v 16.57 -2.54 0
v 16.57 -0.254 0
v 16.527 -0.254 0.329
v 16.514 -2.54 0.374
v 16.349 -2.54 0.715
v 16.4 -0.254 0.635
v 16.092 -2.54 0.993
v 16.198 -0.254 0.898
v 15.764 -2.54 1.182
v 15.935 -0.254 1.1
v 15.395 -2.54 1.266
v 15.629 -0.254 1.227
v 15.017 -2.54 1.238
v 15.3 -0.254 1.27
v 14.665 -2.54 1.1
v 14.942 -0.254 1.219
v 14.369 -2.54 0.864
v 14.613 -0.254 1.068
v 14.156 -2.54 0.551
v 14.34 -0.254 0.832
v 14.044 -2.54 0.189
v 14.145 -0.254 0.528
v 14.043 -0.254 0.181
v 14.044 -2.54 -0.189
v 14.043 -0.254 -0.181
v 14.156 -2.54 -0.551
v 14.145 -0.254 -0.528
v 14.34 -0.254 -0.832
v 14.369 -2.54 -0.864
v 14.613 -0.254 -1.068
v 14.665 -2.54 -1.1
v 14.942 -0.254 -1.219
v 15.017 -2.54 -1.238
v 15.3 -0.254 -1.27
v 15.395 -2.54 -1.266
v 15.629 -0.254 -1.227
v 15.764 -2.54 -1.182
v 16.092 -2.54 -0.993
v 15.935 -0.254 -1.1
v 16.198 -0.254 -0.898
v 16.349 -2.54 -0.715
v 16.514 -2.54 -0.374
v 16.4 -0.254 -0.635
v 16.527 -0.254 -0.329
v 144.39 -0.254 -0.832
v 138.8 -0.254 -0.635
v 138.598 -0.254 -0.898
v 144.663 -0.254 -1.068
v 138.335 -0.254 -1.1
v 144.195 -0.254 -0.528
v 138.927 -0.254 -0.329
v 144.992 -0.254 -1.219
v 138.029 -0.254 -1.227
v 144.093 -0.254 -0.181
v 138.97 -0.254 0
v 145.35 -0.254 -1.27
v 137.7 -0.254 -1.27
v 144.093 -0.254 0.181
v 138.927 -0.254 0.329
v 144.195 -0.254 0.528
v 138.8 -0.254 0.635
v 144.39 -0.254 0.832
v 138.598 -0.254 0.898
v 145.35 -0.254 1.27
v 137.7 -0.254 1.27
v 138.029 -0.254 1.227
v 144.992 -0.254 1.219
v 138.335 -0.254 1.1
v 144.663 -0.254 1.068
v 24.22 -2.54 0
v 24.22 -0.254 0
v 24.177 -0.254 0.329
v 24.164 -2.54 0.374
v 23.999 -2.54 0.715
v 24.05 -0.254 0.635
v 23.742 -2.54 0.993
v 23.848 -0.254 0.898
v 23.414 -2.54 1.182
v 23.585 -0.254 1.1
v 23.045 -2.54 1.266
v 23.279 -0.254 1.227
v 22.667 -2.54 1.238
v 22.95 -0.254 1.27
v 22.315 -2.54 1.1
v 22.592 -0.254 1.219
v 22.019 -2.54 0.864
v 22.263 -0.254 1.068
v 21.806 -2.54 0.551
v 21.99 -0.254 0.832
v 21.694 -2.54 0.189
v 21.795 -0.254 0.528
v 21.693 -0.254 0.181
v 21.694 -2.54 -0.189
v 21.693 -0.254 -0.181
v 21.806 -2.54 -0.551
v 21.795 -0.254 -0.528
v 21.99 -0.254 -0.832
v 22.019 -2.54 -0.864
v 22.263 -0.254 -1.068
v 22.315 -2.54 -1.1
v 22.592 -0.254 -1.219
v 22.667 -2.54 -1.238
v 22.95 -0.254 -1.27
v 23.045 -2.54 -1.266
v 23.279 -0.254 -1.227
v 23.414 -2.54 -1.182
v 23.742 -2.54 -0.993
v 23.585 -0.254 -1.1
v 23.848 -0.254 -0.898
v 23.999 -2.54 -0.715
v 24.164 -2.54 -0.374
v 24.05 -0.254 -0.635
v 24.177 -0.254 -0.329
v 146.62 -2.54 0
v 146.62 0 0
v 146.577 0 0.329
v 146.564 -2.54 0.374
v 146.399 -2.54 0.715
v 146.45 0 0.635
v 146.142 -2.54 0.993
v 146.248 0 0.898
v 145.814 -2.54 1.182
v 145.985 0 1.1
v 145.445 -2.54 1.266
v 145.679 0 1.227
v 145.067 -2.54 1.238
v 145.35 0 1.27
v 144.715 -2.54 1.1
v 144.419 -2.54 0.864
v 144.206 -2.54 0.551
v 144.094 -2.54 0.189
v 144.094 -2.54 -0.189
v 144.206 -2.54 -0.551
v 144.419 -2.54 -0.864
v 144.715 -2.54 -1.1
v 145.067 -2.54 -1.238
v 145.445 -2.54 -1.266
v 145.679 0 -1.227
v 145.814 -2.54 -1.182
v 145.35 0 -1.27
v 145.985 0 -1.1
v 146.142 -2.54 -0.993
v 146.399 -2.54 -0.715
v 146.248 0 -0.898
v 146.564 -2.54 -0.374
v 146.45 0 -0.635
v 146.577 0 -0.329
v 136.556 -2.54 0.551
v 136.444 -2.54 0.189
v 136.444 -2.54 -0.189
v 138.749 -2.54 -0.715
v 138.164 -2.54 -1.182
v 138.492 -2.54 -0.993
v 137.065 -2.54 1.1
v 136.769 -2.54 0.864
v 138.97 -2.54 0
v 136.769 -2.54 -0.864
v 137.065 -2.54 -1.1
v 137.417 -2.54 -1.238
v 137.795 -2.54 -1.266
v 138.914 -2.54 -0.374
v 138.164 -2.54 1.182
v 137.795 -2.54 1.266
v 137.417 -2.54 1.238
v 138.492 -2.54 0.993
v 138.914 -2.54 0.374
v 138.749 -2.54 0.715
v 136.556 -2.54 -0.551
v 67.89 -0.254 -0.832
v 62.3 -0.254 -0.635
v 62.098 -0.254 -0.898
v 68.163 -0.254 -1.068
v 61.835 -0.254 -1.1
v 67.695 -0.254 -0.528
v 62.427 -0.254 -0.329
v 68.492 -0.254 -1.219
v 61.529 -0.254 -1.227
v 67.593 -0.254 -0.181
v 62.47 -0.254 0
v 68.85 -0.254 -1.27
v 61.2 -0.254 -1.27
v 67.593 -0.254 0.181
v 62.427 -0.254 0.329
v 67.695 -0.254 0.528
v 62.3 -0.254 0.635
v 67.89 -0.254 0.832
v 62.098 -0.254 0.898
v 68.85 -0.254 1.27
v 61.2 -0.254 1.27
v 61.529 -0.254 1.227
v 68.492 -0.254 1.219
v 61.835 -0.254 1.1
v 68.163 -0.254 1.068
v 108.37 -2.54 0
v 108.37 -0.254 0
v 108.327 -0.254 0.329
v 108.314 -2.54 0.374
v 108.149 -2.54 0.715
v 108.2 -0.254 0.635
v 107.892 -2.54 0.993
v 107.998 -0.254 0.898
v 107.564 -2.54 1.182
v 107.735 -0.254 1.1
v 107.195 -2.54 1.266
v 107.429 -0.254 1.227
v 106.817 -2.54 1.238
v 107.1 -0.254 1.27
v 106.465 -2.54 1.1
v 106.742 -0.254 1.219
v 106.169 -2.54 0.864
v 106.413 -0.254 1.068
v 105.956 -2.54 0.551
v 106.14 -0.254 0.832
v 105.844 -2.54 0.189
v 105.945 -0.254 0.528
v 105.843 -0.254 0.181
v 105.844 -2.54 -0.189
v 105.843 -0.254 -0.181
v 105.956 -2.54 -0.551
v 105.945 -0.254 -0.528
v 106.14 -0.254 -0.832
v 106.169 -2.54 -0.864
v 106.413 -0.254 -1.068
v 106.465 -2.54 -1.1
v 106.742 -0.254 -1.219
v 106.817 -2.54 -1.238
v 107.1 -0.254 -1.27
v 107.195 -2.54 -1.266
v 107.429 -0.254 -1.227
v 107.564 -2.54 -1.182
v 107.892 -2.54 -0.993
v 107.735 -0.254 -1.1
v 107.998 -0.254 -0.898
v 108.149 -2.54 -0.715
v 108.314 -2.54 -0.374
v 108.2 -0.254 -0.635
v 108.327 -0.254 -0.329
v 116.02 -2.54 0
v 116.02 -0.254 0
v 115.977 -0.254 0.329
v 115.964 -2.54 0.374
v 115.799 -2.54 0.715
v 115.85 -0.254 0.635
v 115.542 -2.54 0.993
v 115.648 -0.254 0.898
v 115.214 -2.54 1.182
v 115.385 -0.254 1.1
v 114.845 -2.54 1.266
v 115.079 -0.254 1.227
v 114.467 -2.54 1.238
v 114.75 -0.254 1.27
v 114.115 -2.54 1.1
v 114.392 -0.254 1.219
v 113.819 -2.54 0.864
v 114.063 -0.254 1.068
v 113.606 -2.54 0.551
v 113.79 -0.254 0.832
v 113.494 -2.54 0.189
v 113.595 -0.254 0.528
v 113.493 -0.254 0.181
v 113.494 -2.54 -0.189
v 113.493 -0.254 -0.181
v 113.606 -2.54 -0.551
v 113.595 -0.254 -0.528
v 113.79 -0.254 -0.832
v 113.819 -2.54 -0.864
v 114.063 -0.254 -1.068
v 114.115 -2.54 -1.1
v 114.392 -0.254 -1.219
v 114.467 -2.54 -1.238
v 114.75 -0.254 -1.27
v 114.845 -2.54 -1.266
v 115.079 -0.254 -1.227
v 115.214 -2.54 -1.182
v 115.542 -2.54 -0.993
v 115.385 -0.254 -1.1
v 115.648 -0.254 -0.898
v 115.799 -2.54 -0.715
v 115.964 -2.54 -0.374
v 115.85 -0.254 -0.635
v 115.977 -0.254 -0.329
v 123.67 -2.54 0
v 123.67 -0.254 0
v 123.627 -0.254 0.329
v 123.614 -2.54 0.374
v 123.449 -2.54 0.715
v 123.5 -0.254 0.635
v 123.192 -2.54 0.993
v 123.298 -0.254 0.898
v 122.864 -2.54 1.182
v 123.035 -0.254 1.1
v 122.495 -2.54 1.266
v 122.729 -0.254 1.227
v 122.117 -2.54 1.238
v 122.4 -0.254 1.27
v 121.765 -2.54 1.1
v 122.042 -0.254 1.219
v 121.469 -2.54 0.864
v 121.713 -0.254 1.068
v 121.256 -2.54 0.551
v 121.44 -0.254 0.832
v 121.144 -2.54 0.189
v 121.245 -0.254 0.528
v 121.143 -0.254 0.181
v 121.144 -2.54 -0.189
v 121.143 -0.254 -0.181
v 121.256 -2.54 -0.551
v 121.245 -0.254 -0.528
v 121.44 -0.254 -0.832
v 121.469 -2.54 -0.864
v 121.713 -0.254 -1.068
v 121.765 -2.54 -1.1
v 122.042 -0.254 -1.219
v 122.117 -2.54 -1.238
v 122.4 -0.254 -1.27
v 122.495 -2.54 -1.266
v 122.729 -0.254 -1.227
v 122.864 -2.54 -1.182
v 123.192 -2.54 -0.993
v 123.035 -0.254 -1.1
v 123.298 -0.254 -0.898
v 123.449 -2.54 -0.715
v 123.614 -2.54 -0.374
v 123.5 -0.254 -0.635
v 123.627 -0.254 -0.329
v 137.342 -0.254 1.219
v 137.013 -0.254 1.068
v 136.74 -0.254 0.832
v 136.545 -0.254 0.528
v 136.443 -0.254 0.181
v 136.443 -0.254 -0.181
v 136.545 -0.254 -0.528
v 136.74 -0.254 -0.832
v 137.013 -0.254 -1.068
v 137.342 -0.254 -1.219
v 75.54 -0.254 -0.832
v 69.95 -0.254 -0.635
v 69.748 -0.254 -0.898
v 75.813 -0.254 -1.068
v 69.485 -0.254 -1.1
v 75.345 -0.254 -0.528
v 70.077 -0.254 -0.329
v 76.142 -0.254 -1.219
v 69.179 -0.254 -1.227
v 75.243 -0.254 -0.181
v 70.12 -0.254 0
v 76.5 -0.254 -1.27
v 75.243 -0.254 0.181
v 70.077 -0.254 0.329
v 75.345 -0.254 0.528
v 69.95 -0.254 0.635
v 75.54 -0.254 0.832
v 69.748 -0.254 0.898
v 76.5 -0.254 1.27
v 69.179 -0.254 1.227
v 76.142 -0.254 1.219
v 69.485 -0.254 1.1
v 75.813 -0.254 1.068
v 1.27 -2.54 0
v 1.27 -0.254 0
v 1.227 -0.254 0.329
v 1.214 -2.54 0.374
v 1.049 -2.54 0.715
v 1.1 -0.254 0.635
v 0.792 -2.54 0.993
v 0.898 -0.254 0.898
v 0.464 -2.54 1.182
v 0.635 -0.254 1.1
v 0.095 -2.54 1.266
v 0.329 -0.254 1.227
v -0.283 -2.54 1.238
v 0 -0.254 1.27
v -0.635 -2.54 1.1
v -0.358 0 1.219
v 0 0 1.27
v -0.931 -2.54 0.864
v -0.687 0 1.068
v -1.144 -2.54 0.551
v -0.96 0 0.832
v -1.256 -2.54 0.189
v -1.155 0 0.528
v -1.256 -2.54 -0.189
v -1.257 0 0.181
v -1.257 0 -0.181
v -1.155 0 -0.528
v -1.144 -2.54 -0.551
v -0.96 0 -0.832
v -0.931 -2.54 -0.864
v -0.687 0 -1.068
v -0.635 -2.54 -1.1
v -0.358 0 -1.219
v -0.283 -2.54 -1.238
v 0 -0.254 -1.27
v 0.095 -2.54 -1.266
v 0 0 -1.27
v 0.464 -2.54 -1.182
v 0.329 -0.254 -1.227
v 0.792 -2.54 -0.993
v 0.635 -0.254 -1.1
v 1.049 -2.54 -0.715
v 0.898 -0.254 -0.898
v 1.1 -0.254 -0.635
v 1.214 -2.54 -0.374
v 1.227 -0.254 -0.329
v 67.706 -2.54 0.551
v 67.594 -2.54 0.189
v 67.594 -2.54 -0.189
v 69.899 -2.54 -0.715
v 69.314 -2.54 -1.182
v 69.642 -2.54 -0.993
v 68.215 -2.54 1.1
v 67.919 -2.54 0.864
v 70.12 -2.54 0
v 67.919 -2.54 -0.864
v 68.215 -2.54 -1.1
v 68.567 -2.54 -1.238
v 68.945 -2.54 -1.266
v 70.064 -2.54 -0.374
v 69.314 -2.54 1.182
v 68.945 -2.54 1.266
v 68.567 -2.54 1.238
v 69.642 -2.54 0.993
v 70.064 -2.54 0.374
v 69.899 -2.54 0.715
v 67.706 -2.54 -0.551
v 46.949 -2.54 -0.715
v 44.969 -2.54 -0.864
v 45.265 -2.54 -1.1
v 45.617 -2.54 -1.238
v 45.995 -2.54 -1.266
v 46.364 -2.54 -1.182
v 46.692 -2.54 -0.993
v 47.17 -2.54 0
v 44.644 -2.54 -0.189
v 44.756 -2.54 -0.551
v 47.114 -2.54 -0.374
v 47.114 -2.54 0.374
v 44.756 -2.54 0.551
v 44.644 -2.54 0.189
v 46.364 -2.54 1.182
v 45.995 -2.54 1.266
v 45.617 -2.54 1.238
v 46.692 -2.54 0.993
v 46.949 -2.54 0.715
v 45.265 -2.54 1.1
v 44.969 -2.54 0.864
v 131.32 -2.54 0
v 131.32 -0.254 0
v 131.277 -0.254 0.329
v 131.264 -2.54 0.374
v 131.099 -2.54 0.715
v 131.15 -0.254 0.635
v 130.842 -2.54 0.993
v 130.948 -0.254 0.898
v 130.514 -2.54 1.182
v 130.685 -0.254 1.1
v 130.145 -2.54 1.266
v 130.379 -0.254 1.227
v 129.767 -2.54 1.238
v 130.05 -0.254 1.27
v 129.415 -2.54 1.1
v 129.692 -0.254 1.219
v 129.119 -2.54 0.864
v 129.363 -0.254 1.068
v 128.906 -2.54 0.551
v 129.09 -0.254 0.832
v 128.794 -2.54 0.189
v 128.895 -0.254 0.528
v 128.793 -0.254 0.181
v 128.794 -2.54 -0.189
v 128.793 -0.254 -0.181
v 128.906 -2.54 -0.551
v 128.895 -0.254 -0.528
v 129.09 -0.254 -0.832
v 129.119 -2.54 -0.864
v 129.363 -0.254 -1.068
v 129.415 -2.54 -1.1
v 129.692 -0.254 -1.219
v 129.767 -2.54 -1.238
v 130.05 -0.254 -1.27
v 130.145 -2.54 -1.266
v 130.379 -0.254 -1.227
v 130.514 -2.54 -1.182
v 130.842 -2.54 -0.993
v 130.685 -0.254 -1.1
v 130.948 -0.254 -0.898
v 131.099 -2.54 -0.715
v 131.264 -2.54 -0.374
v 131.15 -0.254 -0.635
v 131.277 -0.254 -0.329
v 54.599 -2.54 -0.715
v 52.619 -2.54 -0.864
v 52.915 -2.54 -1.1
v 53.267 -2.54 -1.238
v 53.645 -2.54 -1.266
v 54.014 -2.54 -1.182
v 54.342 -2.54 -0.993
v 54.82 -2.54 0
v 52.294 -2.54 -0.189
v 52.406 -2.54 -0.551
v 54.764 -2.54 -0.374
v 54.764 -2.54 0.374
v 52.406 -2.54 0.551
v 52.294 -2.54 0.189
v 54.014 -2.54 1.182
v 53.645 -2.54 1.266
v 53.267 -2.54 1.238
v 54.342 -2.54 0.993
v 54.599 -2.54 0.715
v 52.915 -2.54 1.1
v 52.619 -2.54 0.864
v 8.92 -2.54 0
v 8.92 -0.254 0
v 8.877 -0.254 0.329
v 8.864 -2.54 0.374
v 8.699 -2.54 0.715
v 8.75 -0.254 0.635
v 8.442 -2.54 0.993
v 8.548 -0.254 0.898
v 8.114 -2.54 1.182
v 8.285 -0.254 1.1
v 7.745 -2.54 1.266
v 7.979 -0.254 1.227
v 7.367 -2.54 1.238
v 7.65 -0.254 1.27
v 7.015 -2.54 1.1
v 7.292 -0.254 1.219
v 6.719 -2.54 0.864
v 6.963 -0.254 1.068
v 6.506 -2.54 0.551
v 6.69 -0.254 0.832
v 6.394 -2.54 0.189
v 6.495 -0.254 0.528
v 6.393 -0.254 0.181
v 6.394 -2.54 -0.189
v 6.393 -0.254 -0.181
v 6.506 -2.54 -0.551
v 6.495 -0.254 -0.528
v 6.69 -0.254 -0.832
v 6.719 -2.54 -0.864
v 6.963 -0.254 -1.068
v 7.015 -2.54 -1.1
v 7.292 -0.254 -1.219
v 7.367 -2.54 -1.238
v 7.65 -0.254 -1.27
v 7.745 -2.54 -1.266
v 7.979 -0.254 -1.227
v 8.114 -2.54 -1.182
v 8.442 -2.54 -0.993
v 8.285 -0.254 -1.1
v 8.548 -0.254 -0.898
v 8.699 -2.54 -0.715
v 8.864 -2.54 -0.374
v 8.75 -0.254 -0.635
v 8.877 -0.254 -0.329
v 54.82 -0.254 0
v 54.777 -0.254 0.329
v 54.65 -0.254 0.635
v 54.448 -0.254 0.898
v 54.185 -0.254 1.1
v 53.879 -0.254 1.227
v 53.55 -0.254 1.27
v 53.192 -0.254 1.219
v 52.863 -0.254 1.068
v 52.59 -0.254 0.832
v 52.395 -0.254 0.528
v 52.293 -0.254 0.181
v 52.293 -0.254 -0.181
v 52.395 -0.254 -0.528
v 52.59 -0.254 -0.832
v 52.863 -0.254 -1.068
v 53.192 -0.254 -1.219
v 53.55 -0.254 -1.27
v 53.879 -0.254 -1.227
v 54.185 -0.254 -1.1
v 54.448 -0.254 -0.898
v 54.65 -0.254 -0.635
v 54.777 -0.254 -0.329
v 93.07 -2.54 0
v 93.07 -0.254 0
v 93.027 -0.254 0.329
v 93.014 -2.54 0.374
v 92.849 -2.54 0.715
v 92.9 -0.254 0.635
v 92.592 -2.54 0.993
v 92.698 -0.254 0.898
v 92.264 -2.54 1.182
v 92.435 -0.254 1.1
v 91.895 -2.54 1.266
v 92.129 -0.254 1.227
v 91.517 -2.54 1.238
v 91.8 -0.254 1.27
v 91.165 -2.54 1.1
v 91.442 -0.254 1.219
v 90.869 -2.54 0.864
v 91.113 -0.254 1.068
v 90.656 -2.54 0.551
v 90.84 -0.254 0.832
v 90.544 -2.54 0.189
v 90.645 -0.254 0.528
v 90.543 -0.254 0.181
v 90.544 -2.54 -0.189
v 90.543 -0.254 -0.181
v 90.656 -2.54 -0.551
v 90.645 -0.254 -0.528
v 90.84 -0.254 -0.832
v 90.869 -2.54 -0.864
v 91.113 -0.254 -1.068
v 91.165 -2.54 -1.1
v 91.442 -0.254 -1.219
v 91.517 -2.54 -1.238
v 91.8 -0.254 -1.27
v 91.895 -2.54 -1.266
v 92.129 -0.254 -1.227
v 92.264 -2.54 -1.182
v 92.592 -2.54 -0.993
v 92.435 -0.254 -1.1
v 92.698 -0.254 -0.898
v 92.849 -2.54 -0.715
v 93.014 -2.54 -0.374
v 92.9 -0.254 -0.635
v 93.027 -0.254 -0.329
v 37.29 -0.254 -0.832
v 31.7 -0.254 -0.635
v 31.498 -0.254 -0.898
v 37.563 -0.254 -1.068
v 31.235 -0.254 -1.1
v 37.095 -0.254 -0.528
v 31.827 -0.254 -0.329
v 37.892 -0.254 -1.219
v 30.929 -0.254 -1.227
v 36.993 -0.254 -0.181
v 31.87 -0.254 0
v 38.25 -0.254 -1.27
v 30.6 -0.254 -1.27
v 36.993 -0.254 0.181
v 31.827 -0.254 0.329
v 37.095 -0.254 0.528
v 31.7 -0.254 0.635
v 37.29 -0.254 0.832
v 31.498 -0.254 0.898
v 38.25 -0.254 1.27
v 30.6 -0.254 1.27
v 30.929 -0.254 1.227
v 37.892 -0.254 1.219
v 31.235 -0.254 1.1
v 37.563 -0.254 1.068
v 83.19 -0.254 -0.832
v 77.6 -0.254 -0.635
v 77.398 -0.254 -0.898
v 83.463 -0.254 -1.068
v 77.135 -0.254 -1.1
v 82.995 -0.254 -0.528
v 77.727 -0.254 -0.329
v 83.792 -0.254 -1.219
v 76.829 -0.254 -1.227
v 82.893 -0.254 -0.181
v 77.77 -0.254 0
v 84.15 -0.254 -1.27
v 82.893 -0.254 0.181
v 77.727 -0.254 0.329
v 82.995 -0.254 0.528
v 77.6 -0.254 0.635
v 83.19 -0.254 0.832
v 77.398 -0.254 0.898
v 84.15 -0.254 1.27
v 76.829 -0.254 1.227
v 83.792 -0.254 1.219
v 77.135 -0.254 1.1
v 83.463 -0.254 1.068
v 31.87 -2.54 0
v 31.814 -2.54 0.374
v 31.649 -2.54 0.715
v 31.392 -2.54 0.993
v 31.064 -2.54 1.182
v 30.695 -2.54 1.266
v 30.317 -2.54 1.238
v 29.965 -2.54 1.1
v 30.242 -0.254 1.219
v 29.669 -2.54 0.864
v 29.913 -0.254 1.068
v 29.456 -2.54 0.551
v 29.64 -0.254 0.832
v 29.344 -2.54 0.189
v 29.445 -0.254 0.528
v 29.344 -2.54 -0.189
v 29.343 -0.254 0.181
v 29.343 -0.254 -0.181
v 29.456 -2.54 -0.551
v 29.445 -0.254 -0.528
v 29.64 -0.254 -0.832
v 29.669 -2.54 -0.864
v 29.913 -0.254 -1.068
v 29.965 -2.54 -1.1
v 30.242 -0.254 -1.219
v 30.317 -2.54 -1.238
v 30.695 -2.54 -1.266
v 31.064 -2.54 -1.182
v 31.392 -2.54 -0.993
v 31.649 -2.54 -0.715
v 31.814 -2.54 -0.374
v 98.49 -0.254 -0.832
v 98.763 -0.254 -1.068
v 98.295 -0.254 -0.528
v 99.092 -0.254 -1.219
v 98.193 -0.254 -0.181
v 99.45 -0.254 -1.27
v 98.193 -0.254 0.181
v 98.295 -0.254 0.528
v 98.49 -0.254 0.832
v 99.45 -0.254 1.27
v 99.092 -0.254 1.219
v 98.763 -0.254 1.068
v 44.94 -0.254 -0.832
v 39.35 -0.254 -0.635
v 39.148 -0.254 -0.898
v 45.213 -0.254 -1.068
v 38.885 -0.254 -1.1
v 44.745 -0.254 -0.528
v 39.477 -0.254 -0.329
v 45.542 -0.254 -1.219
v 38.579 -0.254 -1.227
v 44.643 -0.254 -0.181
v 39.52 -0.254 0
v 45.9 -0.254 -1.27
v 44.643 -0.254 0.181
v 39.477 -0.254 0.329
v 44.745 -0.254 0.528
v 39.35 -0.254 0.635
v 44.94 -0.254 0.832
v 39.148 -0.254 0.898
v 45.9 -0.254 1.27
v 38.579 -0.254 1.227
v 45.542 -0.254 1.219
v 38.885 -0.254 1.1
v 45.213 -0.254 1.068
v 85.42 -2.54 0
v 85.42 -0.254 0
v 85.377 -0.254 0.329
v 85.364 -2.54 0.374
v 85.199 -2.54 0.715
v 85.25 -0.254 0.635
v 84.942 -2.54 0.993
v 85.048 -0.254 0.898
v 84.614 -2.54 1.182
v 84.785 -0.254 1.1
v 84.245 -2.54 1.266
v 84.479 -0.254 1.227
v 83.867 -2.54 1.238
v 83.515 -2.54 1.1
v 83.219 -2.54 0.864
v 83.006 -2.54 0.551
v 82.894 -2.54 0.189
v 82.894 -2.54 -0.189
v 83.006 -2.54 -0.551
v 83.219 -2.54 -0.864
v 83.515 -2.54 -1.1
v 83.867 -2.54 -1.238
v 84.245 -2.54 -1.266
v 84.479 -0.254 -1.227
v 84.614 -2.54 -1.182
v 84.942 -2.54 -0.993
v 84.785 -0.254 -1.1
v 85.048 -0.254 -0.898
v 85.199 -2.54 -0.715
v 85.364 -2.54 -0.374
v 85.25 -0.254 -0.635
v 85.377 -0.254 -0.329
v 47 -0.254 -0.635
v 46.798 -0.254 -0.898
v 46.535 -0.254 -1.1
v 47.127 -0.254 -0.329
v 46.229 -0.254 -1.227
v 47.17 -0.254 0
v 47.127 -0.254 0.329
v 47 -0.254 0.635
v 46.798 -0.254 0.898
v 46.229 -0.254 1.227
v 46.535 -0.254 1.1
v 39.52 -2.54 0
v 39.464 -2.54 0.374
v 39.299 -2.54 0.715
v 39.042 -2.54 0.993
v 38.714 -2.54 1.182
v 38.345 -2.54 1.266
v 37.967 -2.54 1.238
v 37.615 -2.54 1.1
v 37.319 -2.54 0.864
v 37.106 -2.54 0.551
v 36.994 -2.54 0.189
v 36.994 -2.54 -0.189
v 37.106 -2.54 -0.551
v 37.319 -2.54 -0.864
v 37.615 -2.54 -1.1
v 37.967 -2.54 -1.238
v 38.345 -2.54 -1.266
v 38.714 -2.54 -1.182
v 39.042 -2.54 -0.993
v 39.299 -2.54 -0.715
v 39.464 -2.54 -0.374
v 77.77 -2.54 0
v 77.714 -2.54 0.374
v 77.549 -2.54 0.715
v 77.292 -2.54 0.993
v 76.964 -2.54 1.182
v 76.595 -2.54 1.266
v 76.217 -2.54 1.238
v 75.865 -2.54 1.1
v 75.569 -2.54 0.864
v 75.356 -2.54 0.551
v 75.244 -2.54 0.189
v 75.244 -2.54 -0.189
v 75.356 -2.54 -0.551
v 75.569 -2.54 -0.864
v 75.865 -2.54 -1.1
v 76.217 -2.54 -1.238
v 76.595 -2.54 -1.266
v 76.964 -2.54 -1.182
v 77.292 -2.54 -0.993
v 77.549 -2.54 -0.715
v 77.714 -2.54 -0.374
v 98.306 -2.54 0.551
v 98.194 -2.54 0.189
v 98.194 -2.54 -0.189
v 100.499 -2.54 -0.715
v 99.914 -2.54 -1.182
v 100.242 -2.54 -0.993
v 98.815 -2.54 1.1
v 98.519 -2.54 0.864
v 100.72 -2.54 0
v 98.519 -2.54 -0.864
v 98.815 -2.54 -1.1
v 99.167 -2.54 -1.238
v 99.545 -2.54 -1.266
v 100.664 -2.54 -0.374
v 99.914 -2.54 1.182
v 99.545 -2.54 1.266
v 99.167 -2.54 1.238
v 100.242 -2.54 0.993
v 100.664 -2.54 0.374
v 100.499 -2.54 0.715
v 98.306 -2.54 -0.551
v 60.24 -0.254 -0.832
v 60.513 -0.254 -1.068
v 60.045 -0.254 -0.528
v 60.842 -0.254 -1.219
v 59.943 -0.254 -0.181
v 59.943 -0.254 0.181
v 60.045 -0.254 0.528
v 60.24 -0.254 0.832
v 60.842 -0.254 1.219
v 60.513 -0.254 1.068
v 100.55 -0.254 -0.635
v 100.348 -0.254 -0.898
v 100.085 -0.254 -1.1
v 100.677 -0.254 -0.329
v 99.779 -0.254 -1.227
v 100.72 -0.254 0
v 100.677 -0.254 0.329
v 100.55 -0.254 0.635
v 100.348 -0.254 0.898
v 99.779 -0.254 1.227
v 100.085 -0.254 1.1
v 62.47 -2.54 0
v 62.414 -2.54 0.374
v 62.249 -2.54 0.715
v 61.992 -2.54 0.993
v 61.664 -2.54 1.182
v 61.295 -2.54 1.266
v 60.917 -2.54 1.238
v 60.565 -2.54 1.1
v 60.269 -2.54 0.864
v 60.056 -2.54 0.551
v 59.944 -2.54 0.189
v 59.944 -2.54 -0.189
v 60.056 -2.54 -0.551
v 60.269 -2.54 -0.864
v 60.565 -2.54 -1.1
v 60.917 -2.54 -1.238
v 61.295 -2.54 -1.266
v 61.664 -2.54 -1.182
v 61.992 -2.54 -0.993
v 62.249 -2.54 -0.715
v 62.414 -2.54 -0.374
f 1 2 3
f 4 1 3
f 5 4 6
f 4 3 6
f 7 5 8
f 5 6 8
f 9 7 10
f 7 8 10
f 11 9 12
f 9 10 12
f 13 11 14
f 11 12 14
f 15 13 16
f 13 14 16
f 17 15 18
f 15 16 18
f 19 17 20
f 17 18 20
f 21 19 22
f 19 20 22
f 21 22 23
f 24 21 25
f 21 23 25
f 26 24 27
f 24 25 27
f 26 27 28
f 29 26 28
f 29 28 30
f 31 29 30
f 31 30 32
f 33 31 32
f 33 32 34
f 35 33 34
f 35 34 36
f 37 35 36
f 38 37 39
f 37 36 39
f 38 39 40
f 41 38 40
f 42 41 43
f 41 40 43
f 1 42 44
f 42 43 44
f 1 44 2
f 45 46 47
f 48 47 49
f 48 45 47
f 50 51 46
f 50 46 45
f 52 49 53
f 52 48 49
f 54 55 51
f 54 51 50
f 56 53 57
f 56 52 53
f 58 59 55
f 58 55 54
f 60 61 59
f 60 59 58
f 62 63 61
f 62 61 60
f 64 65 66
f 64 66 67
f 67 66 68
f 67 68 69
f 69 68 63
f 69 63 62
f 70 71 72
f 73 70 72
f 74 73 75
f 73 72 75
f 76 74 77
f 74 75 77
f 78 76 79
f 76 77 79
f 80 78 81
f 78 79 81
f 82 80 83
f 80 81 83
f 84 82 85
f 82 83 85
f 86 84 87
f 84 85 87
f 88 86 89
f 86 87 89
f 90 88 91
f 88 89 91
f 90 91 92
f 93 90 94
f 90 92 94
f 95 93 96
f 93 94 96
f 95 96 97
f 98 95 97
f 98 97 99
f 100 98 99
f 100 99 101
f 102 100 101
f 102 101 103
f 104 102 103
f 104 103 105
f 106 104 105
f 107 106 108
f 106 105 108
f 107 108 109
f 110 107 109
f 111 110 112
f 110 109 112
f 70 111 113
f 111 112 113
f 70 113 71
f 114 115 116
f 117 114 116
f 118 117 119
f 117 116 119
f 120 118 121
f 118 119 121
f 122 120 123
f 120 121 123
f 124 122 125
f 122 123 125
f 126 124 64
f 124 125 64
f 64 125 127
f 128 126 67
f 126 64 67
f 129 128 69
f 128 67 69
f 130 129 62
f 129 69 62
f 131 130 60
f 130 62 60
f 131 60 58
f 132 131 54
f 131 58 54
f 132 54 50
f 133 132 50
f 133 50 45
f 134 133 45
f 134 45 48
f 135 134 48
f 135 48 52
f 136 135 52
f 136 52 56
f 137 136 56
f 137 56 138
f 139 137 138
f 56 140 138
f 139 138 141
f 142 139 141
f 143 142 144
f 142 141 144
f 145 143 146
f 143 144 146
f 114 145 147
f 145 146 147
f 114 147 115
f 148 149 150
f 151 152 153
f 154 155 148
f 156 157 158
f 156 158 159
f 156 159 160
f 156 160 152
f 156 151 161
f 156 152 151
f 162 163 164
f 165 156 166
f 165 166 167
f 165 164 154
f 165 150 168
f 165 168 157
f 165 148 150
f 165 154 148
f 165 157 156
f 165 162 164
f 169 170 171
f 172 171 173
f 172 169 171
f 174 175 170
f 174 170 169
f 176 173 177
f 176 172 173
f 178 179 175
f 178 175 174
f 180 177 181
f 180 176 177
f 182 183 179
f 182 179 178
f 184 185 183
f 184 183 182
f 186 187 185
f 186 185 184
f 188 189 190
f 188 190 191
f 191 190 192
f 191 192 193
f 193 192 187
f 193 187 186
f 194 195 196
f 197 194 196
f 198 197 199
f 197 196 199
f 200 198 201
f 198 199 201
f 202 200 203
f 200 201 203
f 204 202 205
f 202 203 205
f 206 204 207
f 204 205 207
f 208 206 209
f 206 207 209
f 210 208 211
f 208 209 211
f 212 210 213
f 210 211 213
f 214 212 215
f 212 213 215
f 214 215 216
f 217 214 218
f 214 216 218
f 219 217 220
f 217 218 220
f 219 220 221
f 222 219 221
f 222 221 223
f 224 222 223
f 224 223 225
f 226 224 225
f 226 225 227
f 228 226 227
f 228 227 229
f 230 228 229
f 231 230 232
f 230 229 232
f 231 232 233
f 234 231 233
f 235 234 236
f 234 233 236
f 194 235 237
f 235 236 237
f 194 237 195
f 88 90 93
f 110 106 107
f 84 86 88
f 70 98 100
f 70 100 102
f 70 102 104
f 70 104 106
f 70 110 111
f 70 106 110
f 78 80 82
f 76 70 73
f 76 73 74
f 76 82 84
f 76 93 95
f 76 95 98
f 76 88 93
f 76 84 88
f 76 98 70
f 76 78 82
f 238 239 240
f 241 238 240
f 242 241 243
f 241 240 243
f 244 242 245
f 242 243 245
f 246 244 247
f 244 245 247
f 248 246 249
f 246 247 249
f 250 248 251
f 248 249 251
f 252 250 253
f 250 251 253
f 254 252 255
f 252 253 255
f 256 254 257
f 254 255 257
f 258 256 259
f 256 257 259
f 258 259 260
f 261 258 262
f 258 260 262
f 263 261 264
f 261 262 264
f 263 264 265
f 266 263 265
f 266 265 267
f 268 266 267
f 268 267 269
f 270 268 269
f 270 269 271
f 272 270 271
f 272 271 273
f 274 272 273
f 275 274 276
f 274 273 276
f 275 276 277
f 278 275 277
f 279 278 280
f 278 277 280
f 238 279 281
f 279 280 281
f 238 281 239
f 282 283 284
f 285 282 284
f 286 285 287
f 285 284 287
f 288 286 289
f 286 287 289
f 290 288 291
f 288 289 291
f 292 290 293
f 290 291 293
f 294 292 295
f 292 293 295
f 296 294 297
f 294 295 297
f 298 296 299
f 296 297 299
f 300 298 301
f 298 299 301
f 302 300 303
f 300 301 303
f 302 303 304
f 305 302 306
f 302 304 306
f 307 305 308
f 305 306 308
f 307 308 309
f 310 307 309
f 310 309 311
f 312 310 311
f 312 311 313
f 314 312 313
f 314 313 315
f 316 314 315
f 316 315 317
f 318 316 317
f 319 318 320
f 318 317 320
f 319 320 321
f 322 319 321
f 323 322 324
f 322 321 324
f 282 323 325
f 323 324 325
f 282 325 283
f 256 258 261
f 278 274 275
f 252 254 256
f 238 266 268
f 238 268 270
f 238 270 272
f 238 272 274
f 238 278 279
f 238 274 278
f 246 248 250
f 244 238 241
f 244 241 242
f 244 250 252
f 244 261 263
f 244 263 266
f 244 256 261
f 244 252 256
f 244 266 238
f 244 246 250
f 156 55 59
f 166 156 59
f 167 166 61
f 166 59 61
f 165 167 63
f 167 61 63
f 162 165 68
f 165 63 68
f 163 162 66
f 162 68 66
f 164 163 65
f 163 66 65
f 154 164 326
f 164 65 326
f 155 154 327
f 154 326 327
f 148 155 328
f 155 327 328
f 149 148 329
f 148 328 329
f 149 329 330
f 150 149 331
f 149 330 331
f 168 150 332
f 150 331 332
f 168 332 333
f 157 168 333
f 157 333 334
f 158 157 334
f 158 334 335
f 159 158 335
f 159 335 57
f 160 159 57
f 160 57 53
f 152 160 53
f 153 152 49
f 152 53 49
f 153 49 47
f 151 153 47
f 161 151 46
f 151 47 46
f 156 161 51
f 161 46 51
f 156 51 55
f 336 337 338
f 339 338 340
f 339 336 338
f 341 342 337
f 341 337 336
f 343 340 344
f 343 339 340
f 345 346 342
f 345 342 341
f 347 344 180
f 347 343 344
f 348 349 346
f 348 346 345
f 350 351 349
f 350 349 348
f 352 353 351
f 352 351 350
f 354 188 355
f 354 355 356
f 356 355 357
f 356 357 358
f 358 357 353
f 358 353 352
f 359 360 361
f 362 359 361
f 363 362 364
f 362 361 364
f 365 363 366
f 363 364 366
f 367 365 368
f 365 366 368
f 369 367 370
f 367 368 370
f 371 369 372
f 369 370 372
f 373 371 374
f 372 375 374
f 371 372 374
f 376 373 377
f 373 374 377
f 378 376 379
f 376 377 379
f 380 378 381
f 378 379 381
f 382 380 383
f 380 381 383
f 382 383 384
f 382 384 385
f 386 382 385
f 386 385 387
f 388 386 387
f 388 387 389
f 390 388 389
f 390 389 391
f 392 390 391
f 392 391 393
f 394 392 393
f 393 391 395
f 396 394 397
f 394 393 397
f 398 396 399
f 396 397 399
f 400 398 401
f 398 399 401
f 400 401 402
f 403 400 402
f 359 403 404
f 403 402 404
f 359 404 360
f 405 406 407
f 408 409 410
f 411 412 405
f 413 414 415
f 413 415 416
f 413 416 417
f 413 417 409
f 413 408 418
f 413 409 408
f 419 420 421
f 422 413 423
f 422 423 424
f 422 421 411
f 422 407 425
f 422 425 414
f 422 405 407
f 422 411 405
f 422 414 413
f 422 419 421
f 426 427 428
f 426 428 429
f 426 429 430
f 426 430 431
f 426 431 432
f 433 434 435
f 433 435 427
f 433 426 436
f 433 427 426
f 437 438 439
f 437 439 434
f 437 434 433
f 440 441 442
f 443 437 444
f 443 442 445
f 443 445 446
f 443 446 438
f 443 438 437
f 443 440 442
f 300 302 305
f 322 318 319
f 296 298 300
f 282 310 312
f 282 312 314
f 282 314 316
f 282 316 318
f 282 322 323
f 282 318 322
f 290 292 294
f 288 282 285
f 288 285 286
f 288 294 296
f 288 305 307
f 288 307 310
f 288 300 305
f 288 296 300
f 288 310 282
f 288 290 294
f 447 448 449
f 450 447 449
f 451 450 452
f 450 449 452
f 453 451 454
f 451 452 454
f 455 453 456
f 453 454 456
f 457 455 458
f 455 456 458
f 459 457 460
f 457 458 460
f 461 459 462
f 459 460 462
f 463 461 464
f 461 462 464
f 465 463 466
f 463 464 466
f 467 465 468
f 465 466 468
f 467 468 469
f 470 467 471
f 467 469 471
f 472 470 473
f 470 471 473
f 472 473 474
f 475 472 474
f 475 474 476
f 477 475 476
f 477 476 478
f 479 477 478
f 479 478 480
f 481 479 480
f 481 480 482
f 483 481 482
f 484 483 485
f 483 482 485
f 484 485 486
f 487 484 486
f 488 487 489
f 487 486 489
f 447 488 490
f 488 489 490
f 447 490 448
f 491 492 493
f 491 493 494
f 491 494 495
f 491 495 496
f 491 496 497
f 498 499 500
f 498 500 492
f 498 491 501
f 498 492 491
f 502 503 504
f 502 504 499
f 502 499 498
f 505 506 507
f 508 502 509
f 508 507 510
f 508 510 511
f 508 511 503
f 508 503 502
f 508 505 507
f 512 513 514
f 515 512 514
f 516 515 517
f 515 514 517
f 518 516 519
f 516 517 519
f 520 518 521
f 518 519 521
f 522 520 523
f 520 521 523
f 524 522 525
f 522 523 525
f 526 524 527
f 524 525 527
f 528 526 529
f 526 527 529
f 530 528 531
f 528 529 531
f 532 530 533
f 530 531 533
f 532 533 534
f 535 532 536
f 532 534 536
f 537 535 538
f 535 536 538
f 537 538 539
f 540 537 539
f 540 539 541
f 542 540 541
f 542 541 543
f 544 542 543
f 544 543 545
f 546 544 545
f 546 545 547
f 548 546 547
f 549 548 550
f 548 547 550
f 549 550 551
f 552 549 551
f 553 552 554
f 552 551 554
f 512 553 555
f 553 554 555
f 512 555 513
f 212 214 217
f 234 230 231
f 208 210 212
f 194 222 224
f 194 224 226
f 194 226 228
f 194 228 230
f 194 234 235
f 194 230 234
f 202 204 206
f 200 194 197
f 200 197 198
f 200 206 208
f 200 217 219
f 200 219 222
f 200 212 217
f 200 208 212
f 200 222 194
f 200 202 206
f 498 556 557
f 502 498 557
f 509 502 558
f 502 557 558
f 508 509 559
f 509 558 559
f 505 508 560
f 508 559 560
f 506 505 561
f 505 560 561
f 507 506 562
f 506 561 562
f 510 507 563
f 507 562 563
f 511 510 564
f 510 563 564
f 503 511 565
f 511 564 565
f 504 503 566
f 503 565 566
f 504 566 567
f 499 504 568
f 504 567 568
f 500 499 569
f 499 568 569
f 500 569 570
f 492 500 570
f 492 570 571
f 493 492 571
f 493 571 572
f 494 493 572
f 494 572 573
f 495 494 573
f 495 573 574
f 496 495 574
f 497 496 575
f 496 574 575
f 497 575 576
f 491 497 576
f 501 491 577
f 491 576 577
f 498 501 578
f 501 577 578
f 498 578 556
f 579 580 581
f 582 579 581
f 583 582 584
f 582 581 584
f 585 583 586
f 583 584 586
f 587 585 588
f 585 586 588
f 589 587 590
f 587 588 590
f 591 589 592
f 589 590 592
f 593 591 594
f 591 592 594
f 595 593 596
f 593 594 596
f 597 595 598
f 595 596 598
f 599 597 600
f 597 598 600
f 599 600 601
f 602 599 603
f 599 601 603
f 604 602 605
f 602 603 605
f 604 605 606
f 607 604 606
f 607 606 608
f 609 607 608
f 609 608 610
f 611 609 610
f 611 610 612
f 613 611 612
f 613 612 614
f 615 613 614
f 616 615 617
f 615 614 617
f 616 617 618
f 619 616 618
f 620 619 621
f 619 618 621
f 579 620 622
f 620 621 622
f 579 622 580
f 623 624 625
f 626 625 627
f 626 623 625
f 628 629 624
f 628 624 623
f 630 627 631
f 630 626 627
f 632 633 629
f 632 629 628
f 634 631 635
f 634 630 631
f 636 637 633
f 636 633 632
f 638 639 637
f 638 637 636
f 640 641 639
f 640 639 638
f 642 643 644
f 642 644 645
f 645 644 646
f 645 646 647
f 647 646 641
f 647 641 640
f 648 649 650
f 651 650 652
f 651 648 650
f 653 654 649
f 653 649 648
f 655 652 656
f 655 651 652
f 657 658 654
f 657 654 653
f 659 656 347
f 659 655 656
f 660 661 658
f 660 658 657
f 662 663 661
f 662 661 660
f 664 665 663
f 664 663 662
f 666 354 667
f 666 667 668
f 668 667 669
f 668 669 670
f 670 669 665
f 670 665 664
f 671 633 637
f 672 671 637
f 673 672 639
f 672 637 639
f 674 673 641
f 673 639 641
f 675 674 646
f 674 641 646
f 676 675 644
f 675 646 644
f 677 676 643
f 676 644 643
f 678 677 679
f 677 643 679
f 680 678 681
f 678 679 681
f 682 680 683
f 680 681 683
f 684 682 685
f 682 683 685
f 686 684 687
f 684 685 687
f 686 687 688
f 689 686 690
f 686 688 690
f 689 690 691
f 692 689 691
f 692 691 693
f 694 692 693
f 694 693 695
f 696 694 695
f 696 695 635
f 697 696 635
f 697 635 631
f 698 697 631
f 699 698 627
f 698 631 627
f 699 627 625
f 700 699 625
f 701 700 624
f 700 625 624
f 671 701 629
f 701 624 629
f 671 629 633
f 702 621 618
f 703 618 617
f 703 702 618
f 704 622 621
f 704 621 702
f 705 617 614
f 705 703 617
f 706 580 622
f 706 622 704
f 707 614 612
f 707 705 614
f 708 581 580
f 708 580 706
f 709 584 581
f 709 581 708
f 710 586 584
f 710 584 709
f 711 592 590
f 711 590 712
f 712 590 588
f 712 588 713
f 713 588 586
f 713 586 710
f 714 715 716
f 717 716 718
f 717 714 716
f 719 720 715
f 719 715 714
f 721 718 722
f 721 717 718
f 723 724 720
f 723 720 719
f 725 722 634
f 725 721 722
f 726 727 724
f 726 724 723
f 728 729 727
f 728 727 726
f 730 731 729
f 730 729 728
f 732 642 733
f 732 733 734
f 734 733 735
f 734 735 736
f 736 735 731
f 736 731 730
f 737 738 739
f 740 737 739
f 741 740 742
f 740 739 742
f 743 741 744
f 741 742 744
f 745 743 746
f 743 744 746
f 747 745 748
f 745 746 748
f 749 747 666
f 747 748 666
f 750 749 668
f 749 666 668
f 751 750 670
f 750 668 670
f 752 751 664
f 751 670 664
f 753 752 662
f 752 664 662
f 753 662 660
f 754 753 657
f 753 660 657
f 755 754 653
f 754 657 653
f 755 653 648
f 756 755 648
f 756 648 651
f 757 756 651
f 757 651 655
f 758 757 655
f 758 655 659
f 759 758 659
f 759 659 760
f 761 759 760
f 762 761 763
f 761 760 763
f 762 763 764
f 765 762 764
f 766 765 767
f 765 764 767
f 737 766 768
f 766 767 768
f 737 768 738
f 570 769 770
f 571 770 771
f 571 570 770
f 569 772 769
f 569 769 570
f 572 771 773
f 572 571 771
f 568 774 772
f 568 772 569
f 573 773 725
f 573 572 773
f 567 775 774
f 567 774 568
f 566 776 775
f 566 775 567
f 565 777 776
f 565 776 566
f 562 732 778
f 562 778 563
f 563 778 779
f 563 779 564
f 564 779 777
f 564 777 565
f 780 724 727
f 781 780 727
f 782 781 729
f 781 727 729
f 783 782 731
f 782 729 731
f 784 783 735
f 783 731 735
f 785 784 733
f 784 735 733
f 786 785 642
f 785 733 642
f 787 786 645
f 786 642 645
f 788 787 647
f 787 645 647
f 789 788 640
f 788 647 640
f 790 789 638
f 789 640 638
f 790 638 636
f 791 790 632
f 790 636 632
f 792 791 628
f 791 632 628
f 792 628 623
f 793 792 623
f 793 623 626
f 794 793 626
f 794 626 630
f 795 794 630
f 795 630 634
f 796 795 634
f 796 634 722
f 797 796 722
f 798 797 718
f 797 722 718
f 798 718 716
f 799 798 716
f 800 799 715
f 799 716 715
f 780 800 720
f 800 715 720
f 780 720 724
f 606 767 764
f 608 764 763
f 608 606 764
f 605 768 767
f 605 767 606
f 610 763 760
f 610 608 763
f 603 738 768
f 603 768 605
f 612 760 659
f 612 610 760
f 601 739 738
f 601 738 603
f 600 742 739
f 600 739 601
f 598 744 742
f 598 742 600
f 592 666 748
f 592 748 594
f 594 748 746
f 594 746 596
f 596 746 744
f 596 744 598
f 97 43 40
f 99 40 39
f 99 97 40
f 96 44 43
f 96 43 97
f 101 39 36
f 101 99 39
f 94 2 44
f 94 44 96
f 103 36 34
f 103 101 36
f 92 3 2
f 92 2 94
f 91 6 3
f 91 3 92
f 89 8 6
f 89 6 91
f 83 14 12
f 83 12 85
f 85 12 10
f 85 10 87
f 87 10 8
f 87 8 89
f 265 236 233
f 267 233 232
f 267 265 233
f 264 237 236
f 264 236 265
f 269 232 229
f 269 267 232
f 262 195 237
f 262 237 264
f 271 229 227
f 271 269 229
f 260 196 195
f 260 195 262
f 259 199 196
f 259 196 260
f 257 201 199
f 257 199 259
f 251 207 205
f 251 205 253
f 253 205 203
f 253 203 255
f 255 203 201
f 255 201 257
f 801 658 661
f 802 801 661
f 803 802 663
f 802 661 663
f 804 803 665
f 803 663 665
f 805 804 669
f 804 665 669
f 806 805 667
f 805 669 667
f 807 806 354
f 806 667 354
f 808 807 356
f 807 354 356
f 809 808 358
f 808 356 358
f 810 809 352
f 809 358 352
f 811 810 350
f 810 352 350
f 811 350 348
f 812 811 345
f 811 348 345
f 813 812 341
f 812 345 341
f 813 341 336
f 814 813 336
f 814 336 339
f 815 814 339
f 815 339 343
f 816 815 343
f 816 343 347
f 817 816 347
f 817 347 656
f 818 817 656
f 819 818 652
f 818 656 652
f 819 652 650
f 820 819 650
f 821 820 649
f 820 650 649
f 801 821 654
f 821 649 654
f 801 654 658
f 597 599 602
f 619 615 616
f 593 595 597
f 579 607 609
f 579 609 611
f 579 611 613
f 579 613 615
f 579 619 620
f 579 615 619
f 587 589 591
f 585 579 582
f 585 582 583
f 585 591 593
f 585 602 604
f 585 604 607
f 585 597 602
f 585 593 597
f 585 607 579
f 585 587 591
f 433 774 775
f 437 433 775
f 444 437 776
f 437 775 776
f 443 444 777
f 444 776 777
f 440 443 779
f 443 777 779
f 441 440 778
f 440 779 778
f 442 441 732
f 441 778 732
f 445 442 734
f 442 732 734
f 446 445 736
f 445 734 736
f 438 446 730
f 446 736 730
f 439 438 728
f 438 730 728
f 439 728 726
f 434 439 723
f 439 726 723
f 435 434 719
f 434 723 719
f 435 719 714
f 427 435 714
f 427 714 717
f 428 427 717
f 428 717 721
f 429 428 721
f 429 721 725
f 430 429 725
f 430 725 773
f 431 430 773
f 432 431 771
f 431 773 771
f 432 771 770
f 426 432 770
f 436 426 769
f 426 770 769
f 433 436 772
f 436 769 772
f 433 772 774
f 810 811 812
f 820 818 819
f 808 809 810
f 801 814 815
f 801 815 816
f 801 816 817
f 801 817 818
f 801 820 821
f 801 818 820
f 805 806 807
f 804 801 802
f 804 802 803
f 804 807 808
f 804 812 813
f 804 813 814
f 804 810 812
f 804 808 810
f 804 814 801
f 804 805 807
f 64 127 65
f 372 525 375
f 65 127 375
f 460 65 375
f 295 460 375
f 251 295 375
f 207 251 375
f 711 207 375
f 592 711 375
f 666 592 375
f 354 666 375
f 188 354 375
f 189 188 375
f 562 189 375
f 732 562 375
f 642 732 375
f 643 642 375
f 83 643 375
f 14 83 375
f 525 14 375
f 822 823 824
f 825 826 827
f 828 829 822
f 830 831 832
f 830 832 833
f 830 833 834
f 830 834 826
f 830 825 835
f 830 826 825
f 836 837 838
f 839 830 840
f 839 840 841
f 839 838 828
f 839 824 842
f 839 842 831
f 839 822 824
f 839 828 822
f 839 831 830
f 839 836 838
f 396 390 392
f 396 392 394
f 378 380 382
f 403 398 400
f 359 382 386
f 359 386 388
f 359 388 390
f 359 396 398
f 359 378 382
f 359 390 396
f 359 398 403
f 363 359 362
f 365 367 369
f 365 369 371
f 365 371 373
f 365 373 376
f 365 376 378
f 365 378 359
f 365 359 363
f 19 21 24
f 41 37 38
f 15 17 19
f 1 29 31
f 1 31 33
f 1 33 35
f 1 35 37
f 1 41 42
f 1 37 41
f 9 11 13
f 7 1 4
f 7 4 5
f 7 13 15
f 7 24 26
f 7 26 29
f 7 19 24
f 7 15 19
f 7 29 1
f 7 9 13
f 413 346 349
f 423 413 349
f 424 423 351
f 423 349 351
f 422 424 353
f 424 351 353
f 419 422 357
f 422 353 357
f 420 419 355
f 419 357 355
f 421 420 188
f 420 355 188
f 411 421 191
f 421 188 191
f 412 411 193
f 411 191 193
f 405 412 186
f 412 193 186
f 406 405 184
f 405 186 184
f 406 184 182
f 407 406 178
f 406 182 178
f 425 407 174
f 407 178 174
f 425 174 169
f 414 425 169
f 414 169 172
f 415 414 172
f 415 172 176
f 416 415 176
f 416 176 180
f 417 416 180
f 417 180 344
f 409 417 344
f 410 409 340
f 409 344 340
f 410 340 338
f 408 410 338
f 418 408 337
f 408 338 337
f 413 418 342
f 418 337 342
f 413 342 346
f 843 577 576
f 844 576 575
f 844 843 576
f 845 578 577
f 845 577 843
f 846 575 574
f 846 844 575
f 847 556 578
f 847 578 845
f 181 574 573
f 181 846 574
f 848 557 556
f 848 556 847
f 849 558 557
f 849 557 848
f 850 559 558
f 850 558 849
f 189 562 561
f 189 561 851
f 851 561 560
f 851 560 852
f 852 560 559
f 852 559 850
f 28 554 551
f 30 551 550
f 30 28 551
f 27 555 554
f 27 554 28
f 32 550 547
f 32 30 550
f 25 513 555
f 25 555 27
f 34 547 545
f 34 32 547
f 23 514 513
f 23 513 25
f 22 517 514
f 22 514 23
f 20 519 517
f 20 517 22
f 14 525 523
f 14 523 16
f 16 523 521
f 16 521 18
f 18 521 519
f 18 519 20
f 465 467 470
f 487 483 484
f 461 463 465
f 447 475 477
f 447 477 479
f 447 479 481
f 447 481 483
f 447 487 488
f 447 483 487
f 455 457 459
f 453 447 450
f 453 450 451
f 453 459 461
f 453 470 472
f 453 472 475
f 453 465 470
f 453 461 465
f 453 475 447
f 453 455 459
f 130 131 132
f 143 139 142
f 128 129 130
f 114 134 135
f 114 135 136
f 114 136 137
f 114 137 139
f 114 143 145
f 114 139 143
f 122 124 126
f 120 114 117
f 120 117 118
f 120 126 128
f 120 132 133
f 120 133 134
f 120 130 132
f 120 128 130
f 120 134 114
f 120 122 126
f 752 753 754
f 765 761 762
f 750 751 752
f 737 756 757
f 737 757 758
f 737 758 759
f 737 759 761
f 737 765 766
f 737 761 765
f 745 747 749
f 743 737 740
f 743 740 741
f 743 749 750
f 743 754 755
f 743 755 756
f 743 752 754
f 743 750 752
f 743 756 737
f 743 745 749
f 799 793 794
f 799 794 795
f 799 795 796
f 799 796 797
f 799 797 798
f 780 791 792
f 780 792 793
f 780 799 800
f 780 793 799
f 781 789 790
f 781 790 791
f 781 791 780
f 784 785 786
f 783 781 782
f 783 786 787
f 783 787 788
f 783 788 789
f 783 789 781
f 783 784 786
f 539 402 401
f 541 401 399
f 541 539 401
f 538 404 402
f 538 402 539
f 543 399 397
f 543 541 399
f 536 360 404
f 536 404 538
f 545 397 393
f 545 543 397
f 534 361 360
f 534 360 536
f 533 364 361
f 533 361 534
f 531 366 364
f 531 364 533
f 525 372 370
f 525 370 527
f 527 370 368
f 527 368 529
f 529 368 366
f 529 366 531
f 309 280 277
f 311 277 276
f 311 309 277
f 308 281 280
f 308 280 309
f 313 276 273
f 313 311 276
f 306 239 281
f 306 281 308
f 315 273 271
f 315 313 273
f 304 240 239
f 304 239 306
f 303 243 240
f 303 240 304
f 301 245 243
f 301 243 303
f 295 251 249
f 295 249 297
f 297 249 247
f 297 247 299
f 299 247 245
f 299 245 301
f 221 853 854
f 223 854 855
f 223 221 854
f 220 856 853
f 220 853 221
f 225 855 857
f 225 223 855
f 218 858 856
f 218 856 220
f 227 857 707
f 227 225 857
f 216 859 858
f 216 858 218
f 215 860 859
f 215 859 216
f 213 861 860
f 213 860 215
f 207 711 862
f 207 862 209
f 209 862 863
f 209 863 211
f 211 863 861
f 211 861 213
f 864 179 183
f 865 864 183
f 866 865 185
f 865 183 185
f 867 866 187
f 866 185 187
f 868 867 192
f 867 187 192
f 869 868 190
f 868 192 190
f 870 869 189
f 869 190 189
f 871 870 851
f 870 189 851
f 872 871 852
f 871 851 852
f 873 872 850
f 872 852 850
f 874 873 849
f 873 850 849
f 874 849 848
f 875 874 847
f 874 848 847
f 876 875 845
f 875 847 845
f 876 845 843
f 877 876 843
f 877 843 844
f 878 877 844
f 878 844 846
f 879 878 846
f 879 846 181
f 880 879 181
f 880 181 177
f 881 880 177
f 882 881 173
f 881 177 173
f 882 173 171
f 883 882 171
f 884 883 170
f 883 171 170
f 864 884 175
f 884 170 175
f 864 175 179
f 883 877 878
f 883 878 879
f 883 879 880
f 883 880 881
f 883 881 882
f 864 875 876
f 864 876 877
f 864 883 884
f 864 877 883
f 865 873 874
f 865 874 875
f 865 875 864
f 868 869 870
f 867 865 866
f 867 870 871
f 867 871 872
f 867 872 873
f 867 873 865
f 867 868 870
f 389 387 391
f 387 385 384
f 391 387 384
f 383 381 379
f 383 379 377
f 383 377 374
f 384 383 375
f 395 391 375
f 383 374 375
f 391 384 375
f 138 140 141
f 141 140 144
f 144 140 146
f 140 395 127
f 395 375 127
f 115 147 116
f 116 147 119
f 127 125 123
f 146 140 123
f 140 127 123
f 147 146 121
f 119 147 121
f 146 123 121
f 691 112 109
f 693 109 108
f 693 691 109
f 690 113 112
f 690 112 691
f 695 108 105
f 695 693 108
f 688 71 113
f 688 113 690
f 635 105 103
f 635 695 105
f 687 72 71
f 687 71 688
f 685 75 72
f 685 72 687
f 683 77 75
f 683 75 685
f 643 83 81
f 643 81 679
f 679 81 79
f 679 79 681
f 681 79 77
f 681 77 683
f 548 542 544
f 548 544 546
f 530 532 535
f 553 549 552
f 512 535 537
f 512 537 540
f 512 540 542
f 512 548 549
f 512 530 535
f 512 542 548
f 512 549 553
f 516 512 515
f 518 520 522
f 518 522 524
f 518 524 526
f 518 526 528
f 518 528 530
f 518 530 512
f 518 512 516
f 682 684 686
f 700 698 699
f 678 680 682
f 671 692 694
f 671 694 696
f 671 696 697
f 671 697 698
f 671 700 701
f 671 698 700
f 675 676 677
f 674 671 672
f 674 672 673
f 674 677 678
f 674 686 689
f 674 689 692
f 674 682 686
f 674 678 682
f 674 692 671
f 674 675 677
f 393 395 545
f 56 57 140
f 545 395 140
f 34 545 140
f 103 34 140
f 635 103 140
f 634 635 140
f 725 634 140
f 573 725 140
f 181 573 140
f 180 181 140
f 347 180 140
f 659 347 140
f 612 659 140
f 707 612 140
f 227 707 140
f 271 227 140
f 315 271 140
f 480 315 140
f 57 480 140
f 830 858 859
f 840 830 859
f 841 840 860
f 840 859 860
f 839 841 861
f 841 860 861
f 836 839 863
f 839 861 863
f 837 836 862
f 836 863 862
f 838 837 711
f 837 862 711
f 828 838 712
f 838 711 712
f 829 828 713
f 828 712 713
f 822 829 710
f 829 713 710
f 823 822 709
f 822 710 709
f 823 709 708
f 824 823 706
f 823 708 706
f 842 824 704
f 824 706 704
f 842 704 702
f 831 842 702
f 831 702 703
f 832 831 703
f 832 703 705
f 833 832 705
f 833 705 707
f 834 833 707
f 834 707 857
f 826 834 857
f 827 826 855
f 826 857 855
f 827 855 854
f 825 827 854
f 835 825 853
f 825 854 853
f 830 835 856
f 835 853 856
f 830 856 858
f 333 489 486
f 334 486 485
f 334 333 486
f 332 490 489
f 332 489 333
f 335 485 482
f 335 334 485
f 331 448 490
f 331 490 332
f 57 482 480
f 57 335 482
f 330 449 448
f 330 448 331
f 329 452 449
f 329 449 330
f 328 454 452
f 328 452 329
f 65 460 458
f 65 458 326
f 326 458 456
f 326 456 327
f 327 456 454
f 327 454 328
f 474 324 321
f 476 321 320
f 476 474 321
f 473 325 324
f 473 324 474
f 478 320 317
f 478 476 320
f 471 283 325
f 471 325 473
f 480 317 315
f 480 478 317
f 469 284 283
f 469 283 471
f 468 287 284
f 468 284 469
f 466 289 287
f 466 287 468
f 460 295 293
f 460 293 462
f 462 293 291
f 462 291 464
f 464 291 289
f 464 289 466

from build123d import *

# Parameters (mm, degrees)
F0_R     = 1.27
F1_DEPTH = 2.54
F3_DEPTH = 0.254


with BuildPart() as f1:
    # F0 (on Front) → F1 (new body)
    with BuildSketch(Plane.XZ):
        Circle(F0_R)
        with Locations((7.649997, 0)):
            Circle(F0_R)
        with Locations((15.299995, 0)):
            Circle(F0_R)
        with Locations((22.949992, 0)):
            Circle(F0_R)
        with Locations((30.59999, 0)):
            Circle(F0_R)
        with Locations((38.249987, 0)):
            Circle(F0_R)
        with Locations((45.899984, 0)):
            Circle(F0_R)
        with Locations((53.549982, 0)):
            Circle(F0_R)
        with Locations((61.199979, 0)):
            Circle(F0_R)
        with Locations((68.849977, 0)):
            Circle(F0_R)
        with Locations((76.499974, 0)):
            Circle(F0_R)
        with Locations((84.149971, 0)):
            Circle(F0_R)
        with Locations((91.799969, 0)):
            Circle(F0_R)
        with Locations((99.449966, 0)):
            Circle(F0_R)
        with Locations((107.099964, 0)):
            Circle(F0_R)
        with Locations((114.749961, 0)):
            Circle(F0_R)
        with Locations((122.399958, 0)):
            Circle(F0_R)
        with Locations((130.049956, 0)):
            Circle(F0_R)
        with Locations((137.699953, 0)):
            Circle(F0_R)
        with Locations((145.349951, 0)):
            Circle(F0_R)
    extrude(amount=F1_DEPTH)

    # F2 (on Front) → F3 (join)
    with BuildSketch(Plane.XZ):
        Polygon((0, -1.27), (145.349951, -1.27), (145.349951, 0), (145.349951, 1.27), (0, 1.27), align=None)
    extrude(amount=F3_DEPTH)


solid = f1.part
